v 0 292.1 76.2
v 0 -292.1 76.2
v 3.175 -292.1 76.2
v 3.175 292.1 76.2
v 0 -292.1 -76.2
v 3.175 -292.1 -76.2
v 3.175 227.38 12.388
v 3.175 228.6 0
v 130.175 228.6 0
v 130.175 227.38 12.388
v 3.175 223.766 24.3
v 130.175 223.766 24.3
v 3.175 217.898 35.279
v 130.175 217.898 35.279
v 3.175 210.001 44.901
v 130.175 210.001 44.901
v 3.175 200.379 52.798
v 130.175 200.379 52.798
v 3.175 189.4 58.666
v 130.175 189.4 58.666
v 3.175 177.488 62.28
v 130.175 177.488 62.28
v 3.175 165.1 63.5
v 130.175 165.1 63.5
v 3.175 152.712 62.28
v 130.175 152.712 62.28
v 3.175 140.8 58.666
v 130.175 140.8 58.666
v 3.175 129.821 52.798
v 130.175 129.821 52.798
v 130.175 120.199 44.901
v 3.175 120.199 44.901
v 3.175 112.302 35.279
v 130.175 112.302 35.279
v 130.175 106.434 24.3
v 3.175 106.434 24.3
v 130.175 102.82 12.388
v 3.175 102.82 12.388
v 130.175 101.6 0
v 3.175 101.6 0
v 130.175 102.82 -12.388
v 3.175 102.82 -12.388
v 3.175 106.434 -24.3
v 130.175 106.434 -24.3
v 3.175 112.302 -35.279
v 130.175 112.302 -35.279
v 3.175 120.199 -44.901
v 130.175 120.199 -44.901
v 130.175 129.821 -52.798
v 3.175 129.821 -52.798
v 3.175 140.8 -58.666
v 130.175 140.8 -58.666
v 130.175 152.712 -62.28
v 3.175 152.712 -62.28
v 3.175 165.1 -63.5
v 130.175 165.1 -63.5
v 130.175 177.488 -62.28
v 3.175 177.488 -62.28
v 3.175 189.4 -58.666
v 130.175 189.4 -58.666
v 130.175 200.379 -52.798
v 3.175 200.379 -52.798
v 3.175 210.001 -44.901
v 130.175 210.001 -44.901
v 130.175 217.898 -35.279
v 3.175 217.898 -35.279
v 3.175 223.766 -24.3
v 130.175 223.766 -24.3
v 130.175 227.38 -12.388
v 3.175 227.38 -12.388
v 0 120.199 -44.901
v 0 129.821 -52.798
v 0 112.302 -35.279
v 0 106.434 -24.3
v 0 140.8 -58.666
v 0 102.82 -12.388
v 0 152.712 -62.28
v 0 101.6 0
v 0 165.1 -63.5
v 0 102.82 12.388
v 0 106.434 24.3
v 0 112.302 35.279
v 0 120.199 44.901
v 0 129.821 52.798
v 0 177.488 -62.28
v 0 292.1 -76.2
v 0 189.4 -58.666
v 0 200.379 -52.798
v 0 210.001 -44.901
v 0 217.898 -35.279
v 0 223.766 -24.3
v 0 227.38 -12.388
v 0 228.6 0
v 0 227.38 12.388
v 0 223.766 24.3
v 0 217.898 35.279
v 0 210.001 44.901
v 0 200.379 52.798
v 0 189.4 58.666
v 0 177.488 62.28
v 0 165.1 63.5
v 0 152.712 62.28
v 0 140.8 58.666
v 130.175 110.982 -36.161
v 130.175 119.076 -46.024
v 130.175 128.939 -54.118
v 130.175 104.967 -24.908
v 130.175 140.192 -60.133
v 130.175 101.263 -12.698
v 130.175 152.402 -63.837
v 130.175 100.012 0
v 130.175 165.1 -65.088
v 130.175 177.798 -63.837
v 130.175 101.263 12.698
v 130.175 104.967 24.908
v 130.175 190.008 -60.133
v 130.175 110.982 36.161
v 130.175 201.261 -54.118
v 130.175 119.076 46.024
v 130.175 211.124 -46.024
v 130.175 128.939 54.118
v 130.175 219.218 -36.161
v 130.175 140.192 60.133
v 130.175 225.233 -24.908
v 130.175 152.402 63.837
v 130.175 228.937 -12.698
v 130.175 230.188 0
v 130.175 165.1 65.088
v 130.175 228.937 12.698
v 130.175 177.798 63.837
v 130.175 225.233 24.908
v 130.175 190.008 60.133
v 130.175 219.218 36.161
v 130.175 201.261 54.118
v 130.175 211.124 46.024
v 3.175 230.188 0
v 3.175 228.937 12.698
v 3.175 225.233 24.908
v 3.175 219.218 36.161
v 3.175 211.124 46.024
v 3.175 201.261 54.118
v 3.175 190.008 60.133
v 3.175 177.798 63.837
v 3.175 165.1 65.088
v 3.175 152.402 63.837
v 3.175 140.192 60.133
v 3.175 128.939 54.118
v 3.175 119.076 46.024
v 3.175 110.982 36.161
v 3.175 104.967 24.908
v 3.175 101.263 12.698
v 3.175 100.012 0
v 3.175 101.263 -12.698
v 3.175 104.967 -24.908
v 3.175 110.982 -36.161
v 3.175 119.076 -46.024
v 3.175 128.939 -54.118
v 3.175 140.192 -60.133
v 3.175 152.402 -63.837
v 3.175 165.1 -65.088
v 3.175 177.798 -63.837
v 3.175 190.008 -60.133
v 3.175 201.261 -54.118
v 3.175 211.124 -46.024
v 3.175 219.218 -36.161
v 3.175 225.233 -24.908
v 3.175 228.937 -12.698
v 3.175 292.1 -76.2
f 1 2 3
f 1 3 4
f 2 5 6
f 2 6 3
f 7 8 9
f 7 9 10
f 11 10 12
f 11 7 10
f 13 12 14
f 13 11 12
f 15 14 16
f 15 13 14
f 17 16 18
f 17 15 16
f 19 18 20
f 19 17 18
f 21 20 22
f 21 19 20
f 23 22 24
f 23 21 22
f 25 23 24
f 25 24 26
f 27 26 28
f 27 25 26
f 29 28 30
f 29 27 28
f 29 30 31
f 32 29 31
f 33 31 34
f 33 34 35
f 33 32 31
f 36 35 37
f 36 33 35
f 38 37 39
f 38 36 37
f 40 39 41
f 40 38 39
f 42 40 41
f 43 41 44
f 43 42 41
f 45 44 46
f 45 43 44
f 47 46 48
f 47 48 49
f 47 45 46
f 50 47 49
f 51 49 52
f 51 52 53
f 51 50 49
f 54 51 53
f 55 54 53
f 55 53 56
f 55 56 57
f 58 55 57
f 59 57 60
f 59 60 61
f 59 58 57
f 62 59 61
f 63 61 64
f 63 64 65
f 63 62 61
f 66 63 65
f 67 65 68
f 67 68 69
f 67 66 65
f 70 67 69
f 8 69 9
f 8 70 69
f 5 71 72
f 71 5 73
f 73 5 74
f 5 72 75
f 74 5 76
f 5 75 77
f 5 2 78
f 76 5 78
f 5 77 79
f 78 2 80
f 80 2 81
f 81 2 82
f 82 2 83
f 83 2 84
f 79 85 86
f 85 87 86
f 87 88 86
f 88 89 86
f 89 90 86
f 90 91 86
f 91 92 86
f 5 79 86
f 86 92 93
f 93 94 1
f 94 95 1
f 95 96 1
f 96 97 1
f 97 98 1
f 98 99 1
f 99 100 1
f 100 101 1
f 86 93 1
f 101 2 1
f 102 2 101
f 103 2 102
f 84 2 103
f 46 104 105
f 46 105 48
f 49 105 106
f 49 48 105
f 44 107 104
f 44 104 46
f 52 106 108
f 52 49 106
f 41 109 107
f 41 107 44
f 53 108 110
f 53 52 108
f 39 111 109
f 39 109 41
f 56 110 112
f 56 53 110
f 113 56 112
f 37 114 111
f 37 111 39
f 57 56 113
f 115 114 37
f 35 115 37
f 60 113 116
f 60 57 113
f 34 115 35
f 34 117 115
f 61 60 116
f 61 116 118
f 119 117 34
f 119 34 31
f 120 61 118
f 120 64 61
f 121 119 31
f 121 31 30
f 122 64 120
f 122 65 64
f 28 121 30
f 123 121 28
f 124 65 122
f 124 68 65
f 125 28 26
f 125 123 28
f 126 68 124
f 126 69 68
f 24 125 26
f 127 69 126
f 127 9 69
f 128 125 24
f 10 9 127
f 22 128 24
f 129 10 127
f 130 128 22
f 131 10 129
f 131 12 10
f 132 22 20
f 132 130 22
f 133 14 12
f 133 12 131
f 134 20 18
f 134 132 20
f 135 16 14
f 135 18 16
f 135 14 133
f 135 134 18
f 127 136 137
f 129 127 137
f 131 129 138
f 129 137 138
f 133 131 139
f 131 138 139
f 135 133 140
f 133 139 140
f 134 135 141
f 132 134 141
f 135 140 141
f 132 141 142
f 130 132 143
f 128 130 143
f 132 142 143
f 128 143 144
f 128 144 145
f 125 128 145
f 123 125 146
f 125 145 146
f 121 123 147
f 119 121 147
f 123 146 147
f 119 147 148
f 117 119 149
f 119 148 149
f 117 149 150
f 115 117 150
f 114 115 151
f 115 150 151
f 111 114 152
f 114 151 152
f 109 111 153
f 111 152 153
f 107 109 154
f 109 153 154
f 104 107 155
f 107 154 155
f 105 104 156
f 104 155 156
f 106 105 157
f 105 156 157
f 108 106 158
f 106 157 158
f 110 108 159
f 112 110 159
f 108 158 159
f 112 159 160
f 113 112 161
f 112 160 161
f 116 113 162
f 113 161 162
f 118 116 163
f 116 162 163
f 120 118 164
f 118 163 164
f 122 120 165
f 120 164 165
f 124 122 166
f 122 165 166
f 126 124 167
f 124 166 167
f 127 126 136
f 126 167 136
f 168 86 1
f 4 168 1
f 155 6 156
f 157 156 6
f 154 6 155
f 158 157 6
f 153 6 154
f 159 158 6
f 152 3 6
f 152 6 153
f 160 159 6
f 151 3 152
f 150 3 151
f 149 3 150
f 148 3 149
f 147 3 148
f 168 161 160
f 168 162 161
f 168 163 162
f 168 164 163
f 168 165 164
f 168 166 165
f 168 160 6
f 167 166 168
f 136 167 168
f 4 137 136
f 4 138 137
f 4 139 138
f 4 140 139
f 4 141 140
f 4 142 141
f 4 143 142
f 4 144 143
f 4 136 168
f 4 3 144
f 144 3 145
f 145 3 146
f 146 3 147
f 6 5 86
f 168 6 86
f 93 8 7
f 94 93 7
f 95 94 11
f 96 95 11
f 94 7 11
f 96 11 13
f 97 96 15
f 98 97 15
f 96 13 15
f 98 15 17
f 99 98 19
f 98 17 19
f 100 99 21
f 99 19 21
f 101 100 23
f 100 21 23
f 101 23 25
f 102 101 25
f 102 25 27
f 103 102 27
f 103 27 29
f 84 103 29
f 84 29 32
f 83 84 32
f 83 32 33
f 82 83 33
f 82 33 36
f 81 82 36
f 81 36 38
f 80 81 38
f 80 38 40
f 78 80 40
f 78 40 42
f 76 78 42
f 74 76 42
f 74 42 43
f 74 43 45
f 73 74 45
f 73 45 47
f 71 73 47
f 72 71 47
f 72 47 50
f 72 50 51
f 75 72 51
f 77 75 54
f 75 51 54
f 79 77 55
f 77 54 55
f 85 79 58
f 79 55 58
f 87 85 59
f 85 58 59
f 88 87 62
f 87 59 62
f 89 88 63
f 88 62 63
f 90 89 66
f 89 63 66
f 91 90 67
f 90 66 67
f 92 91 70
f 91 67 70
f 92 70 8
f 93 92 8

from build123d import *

# Parameters (mm, degrees)
F0_W     = 584.2
F0_H     = 152.4
F1_DEPTH = 3.175
F2_R     = 63.5
F3_DEPTH = 25.4
F4_R     = 65.0875
F4_R_2   = 63.5
F5_DEPTH = 127


with BuildPart() as f1:
    # F0 (on Right) → F1 (new body)
    with BuildSketch(Plane.YZ):
        Rectangle(F0_W, F0_H)
    extrude(amount=F1_DEPTH)

    # F2 (on face) → F3 (cut)
    with BuildSketch(Plane.YZ.offset(3.175)):
        with Locations((165.1, 0)):
            Circle(F2_R)
    extrude(amount=-F3_DEPTH, mode=Mode.SUBTRACT)

    # F4 (on face) → F5 (join)
    with BuildSketch(Plane.YZ.offset(3.175)):
        with Locations((165.1, 0)):
            Circle(F4_R)
        with Locations((165.1, 0)):
            Circle(F4_R_2, mode=Mode.SUBTRACT)
    extrude(amount=F5_DEPTH)


solid = f1.part
